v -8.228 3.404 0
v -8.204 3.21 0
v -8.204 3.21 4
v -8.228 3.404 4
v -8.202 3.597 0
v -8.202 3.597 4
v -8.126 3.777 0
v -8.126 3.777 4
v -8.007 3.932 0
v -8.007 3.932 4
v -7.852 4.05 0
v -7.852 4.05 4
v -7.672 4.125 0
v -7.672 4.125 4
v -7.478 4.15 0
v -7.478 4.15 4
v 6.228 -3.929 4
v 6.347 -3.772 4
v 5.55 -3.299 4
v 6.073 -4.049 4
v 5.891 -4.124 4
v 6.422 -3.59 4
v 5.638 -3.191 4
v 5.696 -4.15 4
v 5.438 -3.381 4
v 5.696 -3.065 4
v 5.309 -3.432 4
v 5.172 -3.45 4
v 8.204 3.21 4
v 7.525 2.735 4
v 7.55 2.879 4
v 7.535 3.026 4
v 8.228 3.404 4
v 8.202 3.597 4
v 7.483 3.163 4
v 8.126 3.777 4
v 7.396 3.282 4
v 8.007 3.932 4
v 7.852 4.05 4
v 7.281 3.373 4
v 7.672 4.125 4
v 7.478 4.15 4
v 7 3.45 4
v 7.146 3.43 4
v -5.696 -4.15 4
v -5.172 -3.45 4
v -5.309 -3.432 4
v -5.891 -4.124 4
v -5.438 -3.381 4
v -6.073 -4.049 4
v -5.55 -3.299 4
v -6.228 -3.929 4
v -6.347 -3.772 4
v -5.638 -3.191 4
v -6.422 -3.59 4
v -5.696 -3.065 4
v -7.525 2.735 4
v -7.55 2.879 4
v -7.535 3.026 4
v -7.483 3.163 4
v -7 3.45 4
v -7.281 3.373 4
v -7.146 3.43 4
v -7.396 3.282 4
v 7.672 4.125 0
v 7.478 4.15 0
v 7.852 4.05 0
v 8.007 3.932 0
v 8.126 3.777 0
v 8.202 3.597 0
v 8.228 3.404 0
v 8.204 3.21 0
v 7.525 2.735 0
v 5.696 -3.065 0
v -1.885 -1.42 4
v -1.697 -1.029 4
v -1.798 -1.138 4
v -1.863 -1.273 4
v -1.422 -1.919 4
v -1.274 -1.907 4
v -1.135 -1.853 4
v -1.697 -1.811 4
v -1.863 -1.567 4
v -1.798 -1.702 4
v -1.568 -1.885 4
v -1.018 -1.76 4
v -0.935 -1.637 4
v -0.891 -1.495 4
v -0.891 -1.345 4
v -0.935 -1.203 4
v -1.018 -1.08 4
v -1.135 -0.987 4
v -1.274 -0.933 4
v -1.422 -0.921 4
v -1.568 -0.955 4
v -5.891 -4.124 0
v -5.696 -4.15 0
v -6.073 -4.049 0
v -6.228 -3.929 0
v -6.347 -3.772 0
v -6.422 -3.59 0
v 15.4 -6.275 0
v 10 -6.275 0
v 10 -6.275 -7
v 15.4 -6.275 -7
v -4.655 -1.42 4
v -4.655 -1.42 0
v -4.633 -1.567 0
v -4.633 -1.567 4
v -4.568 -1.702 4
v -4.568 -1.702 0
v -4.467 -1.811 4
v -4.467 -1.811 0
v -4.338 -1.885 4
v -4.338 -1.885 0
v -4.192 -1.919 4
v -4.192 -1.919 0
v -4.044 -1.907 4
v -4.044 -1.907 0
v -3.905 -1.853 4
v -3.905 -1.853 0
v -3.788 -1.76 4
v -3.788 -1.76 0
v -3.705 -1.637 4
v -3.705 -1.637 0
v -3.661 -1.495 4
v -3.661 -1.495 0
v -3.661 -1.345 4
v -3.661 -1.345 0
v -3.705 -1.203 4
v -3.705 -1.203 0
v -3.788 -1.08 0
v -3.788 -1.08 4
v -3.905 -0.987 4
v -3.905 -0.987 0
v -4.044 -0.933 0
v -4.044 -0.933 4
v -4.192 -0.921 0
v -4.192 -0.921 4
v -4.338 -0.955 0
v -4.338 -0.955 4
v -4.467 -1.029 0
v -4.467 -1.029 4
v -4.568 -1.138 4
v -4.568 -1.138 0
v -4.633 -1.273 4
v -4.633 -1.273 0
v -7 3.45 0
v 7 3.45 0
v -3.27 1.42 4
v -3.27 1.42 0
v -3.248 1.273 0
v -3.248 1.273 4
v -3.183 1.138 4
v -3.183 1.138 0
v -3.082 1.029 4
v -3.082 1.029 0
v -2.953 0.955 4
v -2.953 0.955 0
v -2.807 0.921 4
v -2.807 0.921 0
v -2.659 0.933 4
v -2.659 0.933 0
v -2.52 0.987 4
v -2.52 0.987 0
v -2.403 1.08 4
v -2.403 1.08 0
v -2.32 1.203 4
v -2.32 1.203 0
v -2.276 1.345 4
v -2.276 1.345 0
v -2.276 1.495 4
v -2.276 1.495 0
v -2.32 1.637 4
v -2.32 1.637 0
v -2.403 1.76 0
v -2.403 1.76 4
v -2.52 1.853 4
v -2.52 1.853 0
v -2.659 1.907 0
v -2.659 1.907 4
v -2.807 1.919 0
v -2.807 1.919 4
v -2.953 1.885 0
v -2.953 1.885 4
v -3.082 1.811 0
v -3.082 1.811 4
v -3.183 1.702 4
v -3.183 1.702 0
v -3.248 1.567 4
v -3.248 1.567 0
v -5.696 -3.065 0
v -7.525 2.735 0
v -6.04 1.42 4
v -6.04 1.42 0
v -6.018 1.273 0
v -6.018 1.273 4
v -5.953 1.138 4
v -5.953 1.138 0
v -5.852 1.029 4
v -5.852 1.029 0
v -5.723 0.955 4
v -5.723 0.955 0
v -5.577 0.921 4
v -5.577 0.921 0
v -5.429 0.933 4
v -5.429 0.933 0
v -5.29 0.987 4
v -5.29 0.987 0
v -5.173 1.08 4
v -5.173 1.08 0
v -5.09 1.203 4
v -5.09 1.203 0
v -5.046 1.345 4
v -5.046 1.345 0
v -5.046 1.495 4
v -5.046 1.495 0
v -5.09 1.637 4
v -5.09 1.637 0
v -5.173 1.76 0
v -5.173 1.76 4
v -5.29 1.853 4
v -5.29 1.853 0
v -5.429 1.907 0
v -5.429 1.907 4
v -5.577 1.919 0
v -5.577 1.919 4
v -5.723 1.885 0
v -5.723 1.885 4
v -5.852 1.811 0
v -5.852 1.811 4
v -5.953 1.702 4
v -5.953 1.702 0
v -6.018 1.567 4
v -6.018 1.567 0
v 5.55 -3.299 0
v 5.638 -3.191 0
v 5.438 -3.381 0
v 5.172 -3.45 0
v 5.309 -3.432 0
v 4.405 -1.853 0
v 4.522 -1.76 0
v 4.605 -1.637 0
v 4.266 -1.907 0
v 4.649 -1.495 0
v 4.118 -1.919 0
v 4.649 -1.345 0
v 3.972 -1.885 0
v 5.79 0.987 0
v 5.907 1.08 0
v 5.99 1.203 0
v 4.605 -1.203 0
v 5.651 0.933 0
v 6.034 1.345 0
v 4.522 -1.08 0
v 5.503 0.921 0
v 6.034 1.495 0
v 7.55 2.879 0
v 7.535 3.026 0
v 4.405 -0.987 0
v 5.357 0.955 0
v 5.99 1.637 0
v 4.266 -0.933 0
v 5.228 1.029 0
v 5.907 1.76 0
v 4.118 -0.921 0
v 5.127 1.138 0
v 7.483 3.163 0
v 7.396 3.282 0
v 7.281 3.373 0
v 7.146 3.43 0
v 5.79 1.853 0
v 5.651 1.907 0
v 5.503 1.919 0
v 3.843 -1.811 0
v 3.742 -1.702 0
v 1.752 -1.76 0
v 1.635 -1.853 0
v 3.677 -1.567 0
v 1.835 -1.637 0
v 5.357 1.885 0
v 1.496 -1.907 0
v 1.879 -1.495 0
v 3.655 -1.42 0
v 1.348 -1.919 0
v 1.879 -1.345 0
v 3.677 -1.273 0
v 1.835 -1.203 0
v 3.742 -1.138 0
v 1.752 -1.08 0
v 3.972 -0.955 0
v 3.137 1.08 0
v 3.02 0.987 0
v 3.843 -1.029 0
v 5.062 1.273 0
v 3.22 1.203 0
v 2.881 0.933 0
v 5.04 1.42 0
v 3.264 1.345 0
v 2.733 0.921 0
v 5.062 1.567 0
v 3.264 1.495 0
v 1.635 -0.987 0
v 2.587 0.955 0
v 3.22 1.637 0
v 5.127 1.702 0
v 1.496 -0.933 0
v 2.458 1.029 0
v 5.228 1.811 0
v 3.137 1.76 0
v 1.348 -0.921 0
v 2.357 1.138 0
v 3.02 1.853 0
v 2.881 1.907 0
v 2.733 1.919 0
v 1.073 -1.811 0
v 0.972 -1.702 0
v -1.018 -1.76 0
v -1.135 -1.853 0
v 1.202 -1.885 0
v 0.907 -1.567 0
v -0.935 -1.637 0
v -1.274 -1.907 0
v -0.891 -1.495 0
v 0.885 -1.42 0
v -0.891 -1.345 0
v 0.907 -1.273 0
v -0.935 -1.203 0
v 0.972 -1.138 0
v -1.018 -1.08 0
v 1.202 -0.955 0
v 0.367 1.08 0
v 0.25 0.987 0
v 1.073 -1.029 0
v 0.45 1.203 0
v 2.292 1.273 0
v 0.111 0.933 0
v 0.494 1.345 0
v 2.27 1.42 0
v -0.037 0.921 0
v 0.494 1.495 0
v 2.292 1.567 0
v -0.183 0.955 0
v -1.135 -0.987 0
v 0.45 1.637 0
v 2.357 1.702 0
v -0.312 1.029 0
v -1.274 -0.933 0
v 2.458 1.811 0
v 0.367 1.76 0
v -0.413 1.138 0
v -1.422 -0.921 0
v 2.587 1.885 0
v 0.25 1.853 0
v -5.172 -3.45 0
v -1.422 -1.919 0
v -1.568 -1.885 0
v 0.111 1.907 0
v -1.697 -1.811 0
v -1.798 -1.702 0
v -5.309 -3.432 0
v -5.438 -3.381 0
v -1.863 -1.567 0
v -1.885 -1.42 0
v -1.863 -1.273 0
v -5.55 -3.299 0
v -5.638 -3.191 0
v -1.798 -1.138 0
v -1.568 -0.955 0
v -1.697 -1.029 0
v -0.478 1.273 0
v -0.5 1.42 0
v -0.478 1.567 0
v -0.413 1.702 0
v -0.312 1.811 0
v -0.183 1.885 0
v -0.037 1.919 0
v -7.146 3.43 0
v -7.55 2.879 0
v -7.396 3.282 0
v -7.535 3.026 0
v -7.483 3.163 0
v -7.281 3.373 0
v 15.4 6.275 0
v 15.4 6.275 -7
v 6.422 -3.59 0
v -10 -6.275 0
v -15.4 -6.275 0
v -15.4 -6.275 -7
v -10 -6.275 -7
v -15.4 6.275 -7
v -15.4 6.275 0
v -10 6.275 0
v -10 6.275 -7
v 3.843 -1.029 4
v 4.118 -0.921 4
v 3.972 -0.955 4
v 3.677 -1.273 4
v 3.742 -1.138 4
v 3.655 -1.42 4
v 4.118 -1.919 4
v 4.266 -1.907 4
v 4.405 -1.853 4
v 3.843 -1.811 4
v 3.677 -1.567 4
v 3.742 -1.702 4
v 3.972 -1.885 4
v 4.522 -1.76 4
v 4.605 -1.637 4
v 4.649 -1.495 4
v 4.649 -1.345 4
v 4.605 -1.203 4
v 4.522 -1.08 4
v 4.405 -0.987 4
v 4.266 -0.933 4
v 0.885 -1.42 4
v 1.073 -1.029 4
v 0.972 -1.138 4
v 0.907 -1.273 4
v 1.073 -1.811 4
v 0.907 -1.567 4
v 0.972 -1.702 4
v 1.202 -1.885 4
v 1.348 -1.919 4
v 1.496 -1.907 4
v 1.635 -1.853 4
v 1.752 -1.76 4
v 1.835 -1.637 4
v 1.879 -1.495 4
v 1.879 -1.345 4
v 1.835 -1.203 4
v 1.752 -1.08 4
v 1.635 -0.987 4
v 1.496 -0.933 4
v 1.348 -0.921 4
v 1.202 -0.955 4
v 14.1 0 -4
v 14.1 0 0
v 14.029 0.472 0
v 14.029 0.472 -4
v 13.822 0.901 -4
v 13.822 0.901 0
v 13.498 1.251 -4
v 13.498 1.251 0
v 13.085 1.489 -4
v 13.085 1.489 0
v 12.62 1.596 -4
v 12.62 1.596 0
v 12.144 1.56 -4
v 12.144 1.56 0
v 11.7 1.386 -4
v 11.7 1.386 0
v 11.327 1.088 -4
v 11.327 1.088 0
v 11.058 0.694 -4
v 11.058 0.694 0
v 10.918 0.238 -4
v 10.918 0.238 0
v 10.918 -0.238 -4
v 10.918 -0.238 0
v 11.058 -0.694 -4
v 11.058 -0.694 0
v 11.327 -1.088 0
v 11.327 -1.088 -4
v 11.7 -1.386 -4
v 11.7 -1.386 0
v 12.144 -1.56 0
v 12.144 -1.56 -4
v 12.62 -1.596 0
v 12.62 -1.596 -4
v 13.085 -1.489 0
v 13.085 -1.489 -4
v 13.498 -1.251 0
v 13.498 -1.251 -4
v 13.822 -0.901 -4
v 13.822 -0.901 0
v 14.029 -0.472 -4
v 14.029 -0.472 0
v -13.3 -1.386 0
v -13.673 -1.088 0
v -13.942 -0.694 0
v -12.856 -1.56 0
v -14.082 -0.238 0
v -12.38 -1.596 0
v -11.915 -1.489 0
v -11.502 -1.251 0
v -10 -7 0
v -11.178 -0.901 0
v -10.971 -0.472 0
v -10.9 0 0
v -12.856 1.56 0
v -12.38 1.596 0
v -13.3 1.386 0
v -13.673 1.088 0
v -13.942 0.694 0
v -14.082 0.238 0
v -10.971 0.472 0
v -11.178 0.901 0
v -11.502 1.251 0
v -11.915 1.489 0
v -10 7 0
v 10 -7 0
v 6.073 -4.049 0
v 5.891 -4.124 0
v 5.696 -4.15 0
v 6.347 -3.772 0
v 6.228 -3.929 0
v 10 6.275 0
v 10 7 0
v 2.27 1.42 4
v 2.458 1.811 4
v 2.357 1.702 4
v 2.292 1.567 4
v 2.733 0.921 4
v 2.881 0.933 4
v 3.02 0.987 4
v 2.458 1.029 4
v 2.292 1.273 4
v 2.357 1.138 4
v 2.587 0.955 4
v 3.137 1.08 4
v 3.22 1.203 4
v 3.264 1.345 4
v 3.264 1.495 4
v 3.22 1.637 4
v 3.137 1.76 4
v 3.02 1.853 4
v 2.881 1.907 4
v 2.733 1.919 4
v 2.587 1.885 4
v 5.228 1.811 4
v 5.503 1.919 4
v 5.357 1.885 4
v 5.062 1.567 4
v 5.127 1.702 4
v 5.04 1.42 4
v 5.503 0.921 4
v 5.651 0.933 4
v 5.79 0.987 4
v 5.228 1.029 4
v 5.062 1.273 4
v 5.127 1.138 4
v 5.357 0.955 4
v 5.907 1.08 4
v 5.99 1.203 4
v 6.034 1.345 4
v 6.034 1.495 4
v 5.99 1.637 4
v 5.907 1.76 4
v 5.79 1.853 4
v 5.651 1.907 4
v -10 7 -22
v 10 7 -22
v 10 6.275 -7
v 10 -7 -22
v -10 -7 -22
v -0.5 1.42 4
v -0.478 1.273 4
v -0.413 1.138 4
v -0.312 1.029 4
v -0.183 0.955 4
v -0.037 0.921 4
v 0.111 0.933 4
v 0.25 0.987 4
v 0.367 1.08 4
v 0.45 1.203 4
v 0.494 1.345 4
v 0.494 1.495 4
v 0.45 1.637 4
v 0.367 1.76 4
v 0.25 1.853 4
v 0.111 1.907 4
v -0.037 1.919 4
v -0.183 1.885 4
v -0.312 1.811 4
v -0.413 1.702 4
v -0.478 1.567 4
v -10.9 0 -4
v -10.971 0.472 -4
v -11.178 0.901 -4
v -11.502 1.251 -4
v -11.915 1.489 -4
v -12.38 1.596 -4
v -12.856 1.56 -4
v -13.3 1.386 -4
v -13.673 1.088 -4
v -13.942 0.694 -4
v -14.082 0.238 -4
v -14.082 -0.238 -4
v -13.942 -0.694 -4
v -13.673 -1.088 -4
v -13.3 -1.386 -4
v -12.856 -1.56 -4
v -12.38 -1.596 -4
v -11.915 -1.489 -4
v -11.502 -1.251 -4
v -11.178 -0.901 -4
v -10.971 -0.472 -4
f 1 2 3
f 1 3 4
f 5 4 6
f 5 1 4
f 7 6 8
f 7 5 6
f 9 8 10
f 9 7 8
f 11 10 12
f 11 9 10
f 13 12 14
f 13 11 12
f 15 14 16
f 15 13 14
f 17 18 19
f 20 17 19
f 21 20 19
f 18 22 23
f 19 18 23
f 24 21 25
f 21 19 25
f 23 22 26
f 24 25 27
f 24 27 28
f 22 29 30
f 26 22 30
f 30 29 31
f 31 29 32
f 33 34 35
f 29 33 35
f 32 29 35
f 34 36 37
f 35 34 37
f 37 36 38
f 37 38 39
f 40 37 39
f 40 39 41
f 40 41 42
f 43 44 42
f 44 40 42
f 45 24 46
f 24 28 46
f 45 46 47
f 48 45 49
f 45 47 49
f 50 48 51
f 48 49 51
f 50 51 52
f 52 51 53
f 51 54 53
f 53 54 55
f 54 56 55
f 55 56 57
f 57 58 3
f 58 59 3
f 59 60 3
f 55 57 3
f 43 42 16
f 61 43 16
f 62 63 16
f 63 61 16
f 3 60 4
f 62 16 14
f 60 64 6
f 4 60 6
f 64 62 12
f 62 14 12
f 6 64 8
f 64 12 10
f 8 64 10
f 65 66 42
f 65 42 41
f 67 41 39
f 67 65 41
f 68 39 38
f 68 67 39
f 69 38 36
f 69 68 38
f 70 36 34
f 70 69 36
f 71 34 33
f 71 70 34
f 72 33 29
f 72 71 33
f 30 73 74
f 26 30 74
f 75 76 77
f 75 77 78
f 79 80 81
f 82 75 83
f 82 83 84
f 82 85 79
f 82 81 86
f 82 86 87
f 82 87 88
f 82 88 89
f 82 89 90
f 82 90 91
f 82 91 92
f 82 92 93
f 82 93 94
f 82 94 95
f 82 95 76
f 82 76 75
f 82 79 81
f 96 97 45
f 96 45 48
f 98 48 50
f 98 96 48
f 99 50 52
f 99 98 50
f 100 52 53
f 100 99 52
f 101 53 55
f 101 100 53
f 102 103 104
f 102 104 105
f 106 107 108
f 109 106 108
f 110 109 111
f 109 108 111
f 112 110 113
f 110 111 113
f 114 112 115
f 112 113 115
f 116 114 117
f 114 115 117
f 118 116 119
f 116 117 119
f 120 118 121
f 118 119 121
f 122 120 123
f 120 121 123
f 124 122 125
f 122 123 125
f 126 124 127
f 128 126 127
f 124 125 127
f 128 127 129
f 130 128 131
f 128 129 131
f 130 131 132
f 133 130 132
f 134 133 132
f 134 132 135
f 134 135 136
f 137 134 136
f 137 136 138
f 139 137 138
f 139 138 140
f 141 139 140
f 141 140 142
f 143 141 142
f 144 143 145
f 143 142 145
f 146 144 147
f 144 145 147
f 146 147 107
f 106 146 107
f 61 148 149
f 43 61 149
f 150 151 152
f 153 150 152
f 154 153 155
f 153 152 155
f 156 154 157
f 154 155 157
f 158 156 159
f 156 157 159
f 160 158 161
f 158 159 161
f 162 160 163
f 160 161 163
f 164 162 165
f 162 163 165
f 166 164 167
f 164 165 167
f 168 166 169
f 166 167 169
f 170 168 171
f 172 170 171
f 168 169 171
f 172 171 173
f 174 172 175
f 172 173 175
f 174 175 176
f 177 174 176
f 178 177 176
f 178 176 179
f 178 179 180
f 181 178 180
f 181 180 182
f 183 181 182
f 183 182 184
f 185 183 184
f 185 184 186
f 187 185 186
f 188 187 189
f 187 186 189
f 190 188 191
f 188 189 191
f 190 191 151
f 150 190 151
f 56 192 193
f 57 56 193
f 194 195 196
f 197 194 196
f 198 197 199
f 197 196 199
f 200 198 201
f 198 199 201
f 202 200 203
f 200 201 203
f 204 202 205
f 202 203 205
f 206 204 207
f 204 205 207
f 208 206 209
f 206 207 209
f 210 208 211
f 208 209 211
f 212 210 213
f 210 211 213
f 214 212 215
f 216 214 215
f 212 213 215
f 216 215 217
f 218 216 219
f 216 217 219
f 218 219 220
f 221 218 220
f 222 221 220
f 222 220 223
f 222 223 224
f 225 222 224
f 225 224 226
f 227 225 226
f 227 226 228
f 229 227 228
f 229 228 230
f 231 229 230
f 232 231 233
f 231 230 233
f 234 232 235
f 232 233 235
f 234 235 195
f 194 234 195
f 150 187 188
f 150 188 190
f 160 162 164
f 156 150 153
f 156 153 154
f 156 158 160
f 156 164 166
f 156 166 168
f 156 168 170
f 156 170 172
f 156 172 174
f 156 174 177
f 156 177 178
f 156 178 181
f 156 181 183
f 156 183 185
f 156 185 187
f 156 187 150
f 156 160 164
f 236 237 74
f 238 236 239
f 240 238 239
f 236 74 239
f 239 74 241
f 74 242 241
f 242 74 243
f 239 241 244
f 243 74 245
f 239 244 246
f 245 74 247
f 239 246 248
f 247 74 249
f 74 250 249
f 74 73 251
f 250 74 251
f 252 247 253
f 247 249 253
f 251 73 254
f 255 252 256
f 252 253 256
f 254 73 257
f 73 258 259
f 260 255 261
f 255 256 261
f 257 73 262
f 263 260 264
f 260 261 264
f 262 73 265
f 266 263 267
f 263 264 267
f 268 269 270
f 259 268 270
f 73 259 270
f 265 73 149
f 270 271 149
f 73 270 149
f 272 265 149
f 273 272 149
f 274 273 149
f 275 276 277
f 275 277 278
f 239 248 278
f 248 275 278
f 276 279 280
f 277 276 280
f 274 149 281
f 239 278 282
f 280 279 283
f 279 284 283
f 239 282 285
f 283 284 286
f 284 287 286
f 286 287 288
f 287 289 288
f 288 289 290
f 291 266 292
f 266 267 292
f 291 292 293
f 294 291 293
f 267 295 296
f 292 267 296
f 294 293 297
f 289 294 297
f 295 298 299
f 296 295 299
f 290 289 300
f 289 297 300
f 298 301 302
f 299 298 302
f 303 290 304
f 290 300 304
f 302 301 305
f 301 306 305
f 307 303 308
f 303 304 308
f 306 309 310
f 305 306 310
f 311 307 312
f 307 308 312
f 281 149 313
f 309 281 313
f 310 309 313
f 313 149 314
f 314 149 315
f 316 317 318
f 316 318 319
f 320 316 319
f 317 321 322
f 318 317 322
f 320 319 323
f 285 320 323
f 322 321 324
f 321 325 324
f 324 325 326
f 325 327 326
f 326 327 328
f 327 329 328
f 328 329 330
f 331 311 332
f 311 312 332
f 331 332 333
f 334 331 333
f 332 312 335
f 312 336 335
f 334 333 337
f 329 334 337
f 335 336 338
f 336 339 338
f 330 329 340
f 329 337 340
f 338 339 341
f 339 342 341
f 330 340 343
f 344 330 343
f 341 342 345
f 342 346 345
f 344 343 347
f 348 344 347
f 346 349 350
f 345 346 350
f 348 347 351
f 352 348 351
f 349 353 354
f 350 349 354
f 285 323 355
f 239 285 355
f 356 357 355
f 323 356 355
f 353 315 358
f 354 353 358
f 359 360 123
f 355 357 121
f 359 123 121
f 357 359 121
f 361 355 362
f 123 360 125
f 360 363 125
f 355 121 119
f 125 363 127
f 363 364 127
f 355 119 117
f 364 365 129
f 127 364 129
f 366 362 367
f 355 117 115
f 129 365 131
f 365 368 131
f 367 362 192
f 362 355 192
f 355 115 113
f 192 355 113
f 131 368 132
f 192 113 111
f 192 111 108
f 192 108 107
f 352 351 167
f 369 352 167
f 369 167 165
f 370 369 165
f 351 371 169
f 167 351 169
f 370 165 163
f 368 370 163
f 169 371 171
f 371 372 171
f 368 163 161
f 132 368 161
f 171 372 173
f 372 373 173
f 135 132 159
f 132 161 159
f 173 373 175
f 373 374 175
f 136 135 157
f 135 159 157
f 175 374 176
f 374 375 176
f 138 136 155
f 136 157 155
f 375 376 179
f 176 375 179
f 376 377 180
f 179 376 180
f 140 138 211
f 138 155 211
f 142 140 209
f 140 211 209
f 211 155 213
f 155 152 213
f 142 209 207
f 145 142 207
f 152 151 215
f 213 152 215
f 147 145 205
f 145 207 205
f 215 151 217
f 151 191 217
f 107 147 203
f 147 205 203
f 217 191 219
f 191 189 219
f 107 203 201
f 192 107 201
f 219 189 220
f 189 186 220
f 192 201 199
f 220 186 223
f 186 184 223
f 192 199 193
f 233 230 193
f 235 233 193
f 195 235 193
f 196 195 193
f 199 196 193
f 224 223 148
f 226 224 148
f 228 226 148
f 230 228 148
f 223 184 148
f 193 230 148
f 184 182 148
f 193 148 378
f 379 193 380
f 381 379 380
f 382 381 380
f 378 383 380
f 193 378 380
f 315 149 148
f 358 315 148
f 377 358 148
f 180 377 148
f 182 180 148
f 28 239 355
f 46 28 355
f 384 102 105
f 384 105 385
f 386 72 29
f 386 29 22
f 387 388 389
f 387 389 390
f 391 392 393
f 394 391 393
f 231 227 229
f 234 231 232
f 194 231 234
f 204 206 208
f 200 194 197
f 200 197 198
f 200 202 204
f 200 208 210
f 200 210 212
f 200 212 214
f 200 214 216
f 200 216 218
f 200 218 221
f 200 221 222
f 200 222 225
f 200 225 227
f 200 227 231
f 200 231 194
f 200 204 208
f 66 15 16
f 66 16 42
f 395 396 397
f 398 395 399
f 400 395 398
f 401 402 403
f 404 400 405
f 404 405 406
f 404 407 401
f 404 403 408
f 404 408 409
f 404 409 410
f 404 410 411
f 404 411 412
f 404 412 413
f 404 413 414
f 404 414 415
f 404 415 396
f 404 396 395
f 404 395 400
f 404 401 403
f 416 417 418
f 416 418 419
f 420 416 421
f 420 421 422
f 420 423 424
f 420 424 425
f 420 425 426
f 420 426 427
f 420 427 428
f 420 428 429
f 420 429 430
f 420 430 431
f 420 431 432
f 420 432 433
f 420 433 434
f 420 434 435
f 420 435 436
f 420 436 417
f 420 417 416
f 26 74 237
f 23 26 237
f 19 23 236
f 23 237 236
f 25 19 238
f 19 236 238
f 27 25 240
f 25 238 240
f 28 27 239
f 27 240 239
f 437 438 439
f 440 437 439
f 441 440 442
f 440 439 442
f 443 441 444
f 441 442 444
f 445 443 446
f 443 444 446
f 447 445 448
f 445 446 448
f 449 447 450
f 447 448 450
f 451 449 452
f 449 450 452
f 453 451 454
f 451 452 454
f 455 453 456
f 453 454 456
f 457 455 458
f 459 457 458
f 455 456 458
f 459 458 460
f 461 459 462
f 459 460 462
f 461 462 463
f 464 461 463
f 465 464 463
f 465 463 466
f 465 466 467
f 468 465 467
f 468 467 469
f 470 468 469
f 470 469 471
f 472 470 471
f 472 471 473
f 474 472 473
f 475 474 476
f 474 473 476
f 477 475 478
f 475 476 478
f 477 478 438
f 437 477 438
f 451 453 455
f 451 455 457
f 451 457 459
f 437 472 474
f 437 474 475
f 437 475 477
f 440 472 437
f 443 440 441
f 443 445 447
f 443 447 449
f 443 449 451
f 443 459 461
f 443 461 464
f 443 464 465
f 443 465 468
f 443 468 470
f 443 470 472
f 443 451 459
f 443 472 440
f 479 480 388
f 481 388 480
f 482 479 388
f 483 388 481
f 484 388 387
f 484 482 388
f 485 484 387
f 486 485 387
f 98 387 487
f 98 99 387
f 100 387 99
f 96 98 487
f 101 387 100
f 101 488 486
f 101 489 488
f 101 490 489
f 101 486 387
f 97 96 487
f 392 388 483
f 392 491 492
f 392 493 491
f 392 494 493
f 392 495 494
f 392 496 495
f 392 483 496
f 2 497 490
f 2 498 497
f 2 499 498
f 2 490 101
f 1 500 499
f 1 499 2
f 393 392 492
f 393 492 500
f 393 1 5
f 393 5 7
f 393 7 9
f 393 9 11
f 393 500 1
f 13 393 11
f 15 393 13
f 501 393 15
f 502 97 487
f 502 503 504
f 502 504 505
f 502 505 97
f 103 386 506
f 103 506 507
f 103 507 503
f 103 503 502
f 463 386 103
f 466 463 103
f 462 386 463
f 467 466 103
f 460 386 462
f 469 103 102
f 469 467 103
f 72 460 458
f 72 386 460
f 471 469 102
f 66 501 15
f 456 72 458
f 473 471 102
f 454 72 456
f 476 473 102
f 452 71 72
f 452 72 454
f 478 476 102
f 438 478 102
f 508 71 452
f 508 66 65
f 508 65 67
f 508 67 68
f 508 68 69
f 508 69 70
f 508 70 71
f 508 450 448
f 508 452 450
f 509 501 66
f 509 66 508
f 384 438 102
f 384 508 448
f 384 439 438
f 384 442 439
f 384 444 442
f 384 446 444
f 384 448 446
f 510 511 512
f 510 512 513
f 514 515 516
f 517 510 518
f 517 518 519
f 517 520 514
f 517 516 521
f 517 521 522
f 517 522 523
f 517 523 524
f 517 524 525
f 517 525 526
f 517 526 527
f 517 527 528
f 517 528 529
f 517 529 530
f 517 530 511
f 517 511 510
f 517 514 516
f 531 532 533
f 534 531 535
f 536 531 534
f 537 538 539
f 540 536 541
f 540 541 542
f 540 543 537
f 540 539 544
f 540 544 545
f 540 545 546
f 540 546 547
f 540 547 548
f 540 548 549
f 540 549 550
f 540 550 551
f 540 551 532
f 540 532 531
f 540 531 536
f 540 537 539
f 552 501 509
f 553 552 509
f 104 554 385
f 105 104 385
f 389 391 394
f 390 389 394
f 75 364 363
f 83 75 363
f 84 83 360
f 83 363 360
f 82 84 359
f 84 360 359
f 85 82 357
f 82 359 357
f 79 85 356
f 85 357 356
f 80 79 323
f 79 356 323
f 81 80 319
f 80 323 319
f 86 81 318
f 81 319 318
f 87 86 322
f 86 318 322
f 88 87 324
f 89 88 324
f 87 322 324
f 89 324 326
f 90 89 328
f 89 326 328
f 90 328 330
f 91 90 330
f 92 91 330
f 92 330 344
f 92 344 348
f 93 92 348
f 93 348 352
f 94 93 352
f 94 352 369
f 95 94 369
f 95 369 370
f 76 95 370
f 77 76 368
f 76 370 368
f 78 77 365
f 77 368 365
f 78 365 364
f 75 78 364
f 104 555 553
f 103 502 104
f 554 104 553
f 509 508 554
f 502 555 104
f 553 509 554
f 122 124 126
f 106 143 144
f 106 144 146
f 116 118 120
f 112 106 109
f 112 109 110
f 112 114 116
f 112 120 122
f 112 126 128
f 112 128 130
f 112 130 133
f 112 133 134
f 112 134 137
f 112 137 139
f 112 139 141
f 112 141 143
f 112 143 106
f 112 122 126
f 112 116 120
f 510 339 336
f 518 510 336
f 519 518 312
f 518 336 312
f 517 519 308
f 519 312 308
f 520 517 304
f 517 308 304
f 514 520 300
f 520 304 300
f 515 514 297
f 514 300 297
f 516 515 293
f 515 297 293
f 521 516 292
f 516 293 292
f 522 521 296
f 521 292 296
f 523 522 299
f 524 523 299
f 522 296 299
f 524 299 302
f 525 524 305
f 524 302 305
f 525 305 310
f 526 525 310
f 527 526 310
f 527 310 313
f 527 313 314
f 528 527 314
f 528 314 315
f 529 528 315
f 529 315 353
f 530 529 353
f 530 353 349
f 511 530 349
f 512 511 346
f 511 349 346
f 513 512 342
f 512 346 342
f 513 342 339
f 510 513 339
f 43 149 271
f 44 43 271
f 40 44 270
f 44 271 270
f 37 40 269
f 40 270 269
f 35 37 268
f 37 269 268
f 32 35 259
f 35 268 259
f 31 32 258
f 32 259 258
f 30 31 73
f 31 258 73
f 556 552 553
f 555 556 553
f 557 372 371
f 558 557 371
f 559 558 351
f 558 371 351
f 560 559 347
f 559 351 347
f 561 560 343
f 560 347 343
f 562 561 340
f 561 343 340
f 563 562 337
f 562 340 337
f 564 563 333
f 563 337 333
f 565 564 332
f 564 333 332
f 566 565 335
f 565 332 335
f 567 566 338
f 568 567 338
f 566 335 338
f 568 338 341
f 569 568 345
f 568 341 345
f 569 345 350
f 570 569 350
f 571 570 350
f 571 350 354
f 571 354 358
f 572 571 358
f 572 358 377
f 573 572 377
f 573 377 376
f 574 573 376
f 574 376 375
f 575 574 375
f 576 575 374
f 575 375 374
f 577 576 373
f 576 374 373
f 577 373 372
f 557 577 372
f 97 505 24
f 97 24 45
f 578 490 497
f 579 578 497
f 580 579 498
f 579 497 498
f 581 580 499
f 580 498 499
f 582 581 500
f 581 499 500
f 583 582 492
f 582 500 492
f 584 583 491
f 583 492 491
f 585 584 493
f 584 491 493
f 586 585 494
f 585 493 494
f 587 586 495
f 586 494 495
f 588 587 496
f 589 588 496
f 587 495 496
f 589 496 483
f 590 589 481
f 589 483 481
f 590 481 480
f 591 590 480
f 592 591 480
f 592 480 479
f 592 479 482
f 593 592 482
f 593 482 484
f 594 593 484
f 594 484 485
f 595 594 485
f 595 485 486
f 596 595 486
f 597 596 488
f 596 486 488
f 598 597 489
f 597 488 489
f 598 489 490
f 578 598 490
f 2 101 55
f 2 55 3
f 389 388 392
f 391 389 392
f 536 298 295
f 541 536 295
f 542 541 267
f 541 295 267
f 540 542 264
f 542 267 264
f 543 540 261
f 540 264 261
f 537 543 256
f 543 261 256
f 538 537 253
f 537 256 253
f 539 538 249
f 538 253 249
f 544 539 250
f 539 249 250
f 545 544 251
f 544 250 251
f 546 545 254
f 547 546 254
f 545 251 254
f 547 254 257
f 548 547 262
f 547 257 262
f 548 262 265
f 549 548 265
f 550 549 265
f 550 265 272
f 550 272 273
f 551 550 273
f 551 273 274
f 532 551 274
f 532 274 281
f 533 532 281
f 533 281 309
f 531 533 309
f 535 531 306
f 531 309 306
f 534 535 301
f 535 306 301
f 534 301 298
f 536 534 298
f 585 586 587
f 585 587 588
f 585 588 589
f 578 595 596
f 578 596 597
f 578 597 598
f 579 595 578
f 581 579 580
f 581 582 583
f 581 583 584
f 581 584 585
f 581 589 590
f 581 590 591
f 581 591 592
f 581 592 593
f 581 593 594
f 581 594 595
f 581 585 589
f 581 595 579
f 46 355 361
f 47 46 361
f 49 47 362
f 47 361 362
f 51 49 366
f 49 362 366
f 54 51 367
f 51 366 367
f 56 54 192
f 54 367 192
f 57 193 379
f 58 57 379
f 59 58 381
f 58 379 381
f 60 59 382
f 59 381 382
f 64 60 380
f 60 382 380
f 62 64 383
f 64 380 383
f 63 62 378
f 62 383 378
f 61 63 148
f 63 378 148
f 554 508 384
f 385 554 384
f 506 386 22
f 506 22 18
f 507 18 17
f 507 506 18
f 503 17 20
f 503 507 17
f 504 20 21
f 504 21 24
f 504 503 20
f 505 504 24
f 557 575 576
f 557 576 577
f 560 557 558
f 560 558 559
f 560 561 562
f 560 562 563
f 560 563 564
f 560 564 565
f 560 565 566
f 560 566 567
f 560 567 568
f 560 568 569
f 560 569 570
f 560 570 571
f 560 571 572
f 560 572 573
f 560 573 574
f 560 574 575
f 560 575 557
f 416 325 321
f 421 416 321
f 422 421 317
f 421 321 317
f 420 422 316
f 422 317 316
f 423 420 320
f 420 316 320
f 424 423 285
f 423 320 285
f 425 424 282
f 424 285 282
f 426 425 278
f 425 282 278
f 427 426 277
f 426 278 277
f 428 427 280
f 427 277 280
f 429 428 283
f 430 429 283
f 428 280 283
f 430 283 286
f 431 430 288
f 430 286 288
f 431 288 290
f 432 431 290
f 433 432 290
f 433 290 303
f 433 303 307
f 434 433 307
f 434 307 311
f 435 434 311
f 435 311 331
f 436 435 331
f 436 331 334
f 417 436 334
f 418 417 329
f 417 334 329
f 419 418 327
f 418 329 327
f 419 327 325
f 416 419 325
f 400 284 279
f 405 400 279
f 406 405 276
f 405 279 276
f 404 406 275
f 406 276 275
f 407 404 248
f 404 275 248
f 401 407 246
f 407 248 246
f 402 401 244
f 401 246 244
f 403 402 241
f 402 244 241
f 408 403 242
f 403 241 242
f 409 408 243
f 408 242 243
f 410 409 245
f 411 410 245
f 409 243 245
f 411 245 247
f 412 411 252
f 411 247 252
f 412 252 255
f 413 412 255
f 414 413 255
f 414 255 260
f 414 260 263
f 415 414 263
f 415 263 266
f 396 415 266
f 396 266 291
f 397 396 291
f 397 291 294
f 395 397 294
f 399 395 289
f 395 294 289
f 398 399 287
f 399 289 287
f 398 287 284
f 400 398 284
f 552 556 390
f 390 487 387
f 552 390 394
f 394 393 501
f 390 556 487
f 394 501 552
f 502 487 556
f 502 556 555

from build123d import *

# Parameters (mm, degrees)
SKETCH_1_W                                     = 30.8
SKETCH_1_H                                     = 12.55
M3_01_THINFLANGE_30_80X12_55X0_60_DEPTH        = 0.6
SKETCH_2_W                                     = 30.8
SKETCH_2_H                                     = 12.55
M3_02_FIRSTSHOULDER_30_80X12_55_D7_00_DEPTH    = 7
SKETCH_3_W                                     = 20
SKETCH_3_H                                     = 14
M3_03_SECONDSTAGECORE_20_00X14_00_D22_00_DEPTH = 22
SKETCH_4_R                                     = 2.5
M3_04_SIMPLIFIEDFIXEDPOSTS_DIA5_00_L3_50_DEPTH = 3.5
M3_05_ROUNDEDDGUIDE_OUTERBOSS_L4_00_DEPTH      = 4
M3_06_ROUNDEDDGUIDE_INNEROPENING_DEPTH         = 4
SKETCH_7_R                                     = 0.5
M3_07_9PINS_DIA1_00_L4_00_DEPTH                = 4
SKETCH_8_R                                     = 1.6
M3_08_FIXEDPOSTBORES_DIA3_20_PITCH25_00_DEPTH  = 4


with BuildPart() as part:
    # 草图1 → M3_01_ThinFlange_30.80x12.55x0.60 (new body)
    with BuildSketch(Plane.XY):
        Rectangle(SKETCH_1_W, SKETCH_1_H)
    extrude(amount=-M3_01_THINFLANGE_30_80X12_55X0_60_DEPTH)

    # 草图2 → M3_02_FirstShoulder_30.80x12.55_D7.00 (add)
    with BuildSketch(Plane.XY):
        Rectangle(SKETCH_2_W, SKETCH_2_H)
    extrude(amount=-M3_02_FIRSTSHOULDER_30_80X12_55_D7_00_DEPTH)

    # 草图3 → M3_03_SecondStageCore_20.00x14.00_D22.00_FromFlange (add)
    with BuildSketch(Plane.XY):
        Rectangle(SKETCH_3_W, SKETCH_3_H)
    extrude(amount=-M3_03_SECONDSTAGECORE_20_00X14_00_D22_00_DEPTH)

    # 草图4 → M3_04_SimplifiedFixedPosts_Dia5.00_L3.50 (add)
    with BuildSketch(Plane.XY):
        with Locations((-12.5, 0)):
            Circle(SKETCH_4_R)
        with Locations((12.5, 0)):
            Circle(SKETCH_4_R)
    extrude(amount=-M3_04_SIMPLIFIEDFIXEDPOSTS_DIA5_00_L3_50_DEPTH)

    # 草图5 → M3_05_RoundedDGuide_OuterBoss_L4.00 (add)
    with BuildSketch(Plane.XY):
        with BuildLine():
            Line((-7.478140403, 4.15), (7.478140403, 4.15))
            ThreePointArc((7.478140403, 4.15), (8.071894431, 3.858209727), (8.20364406, 3.209883078))
            Line((8.20364406, 3.209883078), (6.421716349, -3.590116922))
            ThreePointArc((6.421716349, -3.590116922), (6.154422419, -3.993754028), (5.696212692, -4.15))
            Line((5.696212692, -4.15), (-5.696212692, -4.15))
            ThreePointArc((-5.696212692, -4.15), (-6.154422419, -3.993754028), (-6.421716349, -3.590116922))
            Line((-6.421716349, -3.590116922), (-8.20364406, 3.209883078))
            ThreePointArc((-8.20364406, 3.209883078), (-8.071894431, 3.858209727), (-7.478140403, 4.15))
        make_face()
    extrude(amount=M3_05_ROUNDEDDGUIDE_OUTERBOSS_L4_00_DEPTH)

    # 草图6 → M3_06_RoundedDGuide_InnerOpening (cut)
    with BuildSketch(Plane.XY):
        with BuildLine():
            Line((-6.999952877, 3.45), (6.999952877, 3.45))
            ThreePointArc((6.999952877, 3.45), (7.443485369, 3.225236726), (7.524509443, 2.734650647))
            Line((7.524509443, 2.734650647), (5.696248574, -3.065349353))
            ThreePointArc((5.696248574, -3.065349353), (5.496928733, -3.343532493), (5.171692007, -3.45))
            Line((5.171692007, -3.45), (-5.171692007, -3.45))
            ThreePointArc((-5.171692007, -3.45), (-5.496928733, -3.343532493), (-5.696248574, -3.065349353))
            Line((-5.696248574, -3.065349353), (-7.524509443, 2.734650647))
            ThreePointArc((-7.524509443, 2.734650647), (-7.443485369, 3.225236726), (-6.999952877, 3.45))
        make_face()
    extrude(amount=M3_06_ROUNDEDDGUIDE_INNEROPENING_DEPTH, mode=Mode.SUBTRACT)

    # 草图7 → M3_07_9Pins_Dia1.00_L4.00 (add)
    with BuildSketch(Plane.XY):
        with Locations(Location((-5.54, 1.42, 0), (0, 0, 180))):
            Circle(SKETCH_7_R)
        with Locations(Location((-2.77, 1.42, 0), (0, 0, 180))):
            Circle(SKETCH_7_R)
        with Locations(Location((0, 1.42, 0), (0, 0, 180))):
            Circle(SKETCH_7_R)
        with Locations(Location((2.77, 1.42, 0), (0, 0, 180))):
            Circle(SKETCH_7_R)
        with Locations(Location((5.54, 1.42, 0), (0, 0, 180))):
            Circle(SKETCH_7_R)
        with Locations(Location((-4.155, -1.42, 0), (0, 0, 180))):
            Circle(SKETCH_7_R)
        with Locations(Location((-1.385, -1.42, 0), (0, 0, 180))):
            Circle(SKETCH_7_R)
        with Locations(Location((1.385, -1.42, 0), (0, 0, 180))):
            Circle(SKETCH_7_R)
        with Locations(Location((4.155, -1.42, 0), (0, 0, 180))):
            Circle(SKETCH_7_R)
    extrude(amount=M3_07_9PINS_DIA1_00_L4_00_DEPTH)

    # 草图8 → M3_08_FixedPostBores_Dia3.20_Pitch25.00 (cut)
    with BuildSketch(Plane.XY):
        with Locations((-12.5, 0)):
            Circle(SKETCH_8_R)
        with Locations((12.5, 0)):
            Circle(SKETCH_8_R)
    extrude(amount=-M3_08_FIXEDPOSTBORES_DIA3_20_PITCH25_00_DEPTH, mode=Mode.SUBTRACT)


solid = part.part
